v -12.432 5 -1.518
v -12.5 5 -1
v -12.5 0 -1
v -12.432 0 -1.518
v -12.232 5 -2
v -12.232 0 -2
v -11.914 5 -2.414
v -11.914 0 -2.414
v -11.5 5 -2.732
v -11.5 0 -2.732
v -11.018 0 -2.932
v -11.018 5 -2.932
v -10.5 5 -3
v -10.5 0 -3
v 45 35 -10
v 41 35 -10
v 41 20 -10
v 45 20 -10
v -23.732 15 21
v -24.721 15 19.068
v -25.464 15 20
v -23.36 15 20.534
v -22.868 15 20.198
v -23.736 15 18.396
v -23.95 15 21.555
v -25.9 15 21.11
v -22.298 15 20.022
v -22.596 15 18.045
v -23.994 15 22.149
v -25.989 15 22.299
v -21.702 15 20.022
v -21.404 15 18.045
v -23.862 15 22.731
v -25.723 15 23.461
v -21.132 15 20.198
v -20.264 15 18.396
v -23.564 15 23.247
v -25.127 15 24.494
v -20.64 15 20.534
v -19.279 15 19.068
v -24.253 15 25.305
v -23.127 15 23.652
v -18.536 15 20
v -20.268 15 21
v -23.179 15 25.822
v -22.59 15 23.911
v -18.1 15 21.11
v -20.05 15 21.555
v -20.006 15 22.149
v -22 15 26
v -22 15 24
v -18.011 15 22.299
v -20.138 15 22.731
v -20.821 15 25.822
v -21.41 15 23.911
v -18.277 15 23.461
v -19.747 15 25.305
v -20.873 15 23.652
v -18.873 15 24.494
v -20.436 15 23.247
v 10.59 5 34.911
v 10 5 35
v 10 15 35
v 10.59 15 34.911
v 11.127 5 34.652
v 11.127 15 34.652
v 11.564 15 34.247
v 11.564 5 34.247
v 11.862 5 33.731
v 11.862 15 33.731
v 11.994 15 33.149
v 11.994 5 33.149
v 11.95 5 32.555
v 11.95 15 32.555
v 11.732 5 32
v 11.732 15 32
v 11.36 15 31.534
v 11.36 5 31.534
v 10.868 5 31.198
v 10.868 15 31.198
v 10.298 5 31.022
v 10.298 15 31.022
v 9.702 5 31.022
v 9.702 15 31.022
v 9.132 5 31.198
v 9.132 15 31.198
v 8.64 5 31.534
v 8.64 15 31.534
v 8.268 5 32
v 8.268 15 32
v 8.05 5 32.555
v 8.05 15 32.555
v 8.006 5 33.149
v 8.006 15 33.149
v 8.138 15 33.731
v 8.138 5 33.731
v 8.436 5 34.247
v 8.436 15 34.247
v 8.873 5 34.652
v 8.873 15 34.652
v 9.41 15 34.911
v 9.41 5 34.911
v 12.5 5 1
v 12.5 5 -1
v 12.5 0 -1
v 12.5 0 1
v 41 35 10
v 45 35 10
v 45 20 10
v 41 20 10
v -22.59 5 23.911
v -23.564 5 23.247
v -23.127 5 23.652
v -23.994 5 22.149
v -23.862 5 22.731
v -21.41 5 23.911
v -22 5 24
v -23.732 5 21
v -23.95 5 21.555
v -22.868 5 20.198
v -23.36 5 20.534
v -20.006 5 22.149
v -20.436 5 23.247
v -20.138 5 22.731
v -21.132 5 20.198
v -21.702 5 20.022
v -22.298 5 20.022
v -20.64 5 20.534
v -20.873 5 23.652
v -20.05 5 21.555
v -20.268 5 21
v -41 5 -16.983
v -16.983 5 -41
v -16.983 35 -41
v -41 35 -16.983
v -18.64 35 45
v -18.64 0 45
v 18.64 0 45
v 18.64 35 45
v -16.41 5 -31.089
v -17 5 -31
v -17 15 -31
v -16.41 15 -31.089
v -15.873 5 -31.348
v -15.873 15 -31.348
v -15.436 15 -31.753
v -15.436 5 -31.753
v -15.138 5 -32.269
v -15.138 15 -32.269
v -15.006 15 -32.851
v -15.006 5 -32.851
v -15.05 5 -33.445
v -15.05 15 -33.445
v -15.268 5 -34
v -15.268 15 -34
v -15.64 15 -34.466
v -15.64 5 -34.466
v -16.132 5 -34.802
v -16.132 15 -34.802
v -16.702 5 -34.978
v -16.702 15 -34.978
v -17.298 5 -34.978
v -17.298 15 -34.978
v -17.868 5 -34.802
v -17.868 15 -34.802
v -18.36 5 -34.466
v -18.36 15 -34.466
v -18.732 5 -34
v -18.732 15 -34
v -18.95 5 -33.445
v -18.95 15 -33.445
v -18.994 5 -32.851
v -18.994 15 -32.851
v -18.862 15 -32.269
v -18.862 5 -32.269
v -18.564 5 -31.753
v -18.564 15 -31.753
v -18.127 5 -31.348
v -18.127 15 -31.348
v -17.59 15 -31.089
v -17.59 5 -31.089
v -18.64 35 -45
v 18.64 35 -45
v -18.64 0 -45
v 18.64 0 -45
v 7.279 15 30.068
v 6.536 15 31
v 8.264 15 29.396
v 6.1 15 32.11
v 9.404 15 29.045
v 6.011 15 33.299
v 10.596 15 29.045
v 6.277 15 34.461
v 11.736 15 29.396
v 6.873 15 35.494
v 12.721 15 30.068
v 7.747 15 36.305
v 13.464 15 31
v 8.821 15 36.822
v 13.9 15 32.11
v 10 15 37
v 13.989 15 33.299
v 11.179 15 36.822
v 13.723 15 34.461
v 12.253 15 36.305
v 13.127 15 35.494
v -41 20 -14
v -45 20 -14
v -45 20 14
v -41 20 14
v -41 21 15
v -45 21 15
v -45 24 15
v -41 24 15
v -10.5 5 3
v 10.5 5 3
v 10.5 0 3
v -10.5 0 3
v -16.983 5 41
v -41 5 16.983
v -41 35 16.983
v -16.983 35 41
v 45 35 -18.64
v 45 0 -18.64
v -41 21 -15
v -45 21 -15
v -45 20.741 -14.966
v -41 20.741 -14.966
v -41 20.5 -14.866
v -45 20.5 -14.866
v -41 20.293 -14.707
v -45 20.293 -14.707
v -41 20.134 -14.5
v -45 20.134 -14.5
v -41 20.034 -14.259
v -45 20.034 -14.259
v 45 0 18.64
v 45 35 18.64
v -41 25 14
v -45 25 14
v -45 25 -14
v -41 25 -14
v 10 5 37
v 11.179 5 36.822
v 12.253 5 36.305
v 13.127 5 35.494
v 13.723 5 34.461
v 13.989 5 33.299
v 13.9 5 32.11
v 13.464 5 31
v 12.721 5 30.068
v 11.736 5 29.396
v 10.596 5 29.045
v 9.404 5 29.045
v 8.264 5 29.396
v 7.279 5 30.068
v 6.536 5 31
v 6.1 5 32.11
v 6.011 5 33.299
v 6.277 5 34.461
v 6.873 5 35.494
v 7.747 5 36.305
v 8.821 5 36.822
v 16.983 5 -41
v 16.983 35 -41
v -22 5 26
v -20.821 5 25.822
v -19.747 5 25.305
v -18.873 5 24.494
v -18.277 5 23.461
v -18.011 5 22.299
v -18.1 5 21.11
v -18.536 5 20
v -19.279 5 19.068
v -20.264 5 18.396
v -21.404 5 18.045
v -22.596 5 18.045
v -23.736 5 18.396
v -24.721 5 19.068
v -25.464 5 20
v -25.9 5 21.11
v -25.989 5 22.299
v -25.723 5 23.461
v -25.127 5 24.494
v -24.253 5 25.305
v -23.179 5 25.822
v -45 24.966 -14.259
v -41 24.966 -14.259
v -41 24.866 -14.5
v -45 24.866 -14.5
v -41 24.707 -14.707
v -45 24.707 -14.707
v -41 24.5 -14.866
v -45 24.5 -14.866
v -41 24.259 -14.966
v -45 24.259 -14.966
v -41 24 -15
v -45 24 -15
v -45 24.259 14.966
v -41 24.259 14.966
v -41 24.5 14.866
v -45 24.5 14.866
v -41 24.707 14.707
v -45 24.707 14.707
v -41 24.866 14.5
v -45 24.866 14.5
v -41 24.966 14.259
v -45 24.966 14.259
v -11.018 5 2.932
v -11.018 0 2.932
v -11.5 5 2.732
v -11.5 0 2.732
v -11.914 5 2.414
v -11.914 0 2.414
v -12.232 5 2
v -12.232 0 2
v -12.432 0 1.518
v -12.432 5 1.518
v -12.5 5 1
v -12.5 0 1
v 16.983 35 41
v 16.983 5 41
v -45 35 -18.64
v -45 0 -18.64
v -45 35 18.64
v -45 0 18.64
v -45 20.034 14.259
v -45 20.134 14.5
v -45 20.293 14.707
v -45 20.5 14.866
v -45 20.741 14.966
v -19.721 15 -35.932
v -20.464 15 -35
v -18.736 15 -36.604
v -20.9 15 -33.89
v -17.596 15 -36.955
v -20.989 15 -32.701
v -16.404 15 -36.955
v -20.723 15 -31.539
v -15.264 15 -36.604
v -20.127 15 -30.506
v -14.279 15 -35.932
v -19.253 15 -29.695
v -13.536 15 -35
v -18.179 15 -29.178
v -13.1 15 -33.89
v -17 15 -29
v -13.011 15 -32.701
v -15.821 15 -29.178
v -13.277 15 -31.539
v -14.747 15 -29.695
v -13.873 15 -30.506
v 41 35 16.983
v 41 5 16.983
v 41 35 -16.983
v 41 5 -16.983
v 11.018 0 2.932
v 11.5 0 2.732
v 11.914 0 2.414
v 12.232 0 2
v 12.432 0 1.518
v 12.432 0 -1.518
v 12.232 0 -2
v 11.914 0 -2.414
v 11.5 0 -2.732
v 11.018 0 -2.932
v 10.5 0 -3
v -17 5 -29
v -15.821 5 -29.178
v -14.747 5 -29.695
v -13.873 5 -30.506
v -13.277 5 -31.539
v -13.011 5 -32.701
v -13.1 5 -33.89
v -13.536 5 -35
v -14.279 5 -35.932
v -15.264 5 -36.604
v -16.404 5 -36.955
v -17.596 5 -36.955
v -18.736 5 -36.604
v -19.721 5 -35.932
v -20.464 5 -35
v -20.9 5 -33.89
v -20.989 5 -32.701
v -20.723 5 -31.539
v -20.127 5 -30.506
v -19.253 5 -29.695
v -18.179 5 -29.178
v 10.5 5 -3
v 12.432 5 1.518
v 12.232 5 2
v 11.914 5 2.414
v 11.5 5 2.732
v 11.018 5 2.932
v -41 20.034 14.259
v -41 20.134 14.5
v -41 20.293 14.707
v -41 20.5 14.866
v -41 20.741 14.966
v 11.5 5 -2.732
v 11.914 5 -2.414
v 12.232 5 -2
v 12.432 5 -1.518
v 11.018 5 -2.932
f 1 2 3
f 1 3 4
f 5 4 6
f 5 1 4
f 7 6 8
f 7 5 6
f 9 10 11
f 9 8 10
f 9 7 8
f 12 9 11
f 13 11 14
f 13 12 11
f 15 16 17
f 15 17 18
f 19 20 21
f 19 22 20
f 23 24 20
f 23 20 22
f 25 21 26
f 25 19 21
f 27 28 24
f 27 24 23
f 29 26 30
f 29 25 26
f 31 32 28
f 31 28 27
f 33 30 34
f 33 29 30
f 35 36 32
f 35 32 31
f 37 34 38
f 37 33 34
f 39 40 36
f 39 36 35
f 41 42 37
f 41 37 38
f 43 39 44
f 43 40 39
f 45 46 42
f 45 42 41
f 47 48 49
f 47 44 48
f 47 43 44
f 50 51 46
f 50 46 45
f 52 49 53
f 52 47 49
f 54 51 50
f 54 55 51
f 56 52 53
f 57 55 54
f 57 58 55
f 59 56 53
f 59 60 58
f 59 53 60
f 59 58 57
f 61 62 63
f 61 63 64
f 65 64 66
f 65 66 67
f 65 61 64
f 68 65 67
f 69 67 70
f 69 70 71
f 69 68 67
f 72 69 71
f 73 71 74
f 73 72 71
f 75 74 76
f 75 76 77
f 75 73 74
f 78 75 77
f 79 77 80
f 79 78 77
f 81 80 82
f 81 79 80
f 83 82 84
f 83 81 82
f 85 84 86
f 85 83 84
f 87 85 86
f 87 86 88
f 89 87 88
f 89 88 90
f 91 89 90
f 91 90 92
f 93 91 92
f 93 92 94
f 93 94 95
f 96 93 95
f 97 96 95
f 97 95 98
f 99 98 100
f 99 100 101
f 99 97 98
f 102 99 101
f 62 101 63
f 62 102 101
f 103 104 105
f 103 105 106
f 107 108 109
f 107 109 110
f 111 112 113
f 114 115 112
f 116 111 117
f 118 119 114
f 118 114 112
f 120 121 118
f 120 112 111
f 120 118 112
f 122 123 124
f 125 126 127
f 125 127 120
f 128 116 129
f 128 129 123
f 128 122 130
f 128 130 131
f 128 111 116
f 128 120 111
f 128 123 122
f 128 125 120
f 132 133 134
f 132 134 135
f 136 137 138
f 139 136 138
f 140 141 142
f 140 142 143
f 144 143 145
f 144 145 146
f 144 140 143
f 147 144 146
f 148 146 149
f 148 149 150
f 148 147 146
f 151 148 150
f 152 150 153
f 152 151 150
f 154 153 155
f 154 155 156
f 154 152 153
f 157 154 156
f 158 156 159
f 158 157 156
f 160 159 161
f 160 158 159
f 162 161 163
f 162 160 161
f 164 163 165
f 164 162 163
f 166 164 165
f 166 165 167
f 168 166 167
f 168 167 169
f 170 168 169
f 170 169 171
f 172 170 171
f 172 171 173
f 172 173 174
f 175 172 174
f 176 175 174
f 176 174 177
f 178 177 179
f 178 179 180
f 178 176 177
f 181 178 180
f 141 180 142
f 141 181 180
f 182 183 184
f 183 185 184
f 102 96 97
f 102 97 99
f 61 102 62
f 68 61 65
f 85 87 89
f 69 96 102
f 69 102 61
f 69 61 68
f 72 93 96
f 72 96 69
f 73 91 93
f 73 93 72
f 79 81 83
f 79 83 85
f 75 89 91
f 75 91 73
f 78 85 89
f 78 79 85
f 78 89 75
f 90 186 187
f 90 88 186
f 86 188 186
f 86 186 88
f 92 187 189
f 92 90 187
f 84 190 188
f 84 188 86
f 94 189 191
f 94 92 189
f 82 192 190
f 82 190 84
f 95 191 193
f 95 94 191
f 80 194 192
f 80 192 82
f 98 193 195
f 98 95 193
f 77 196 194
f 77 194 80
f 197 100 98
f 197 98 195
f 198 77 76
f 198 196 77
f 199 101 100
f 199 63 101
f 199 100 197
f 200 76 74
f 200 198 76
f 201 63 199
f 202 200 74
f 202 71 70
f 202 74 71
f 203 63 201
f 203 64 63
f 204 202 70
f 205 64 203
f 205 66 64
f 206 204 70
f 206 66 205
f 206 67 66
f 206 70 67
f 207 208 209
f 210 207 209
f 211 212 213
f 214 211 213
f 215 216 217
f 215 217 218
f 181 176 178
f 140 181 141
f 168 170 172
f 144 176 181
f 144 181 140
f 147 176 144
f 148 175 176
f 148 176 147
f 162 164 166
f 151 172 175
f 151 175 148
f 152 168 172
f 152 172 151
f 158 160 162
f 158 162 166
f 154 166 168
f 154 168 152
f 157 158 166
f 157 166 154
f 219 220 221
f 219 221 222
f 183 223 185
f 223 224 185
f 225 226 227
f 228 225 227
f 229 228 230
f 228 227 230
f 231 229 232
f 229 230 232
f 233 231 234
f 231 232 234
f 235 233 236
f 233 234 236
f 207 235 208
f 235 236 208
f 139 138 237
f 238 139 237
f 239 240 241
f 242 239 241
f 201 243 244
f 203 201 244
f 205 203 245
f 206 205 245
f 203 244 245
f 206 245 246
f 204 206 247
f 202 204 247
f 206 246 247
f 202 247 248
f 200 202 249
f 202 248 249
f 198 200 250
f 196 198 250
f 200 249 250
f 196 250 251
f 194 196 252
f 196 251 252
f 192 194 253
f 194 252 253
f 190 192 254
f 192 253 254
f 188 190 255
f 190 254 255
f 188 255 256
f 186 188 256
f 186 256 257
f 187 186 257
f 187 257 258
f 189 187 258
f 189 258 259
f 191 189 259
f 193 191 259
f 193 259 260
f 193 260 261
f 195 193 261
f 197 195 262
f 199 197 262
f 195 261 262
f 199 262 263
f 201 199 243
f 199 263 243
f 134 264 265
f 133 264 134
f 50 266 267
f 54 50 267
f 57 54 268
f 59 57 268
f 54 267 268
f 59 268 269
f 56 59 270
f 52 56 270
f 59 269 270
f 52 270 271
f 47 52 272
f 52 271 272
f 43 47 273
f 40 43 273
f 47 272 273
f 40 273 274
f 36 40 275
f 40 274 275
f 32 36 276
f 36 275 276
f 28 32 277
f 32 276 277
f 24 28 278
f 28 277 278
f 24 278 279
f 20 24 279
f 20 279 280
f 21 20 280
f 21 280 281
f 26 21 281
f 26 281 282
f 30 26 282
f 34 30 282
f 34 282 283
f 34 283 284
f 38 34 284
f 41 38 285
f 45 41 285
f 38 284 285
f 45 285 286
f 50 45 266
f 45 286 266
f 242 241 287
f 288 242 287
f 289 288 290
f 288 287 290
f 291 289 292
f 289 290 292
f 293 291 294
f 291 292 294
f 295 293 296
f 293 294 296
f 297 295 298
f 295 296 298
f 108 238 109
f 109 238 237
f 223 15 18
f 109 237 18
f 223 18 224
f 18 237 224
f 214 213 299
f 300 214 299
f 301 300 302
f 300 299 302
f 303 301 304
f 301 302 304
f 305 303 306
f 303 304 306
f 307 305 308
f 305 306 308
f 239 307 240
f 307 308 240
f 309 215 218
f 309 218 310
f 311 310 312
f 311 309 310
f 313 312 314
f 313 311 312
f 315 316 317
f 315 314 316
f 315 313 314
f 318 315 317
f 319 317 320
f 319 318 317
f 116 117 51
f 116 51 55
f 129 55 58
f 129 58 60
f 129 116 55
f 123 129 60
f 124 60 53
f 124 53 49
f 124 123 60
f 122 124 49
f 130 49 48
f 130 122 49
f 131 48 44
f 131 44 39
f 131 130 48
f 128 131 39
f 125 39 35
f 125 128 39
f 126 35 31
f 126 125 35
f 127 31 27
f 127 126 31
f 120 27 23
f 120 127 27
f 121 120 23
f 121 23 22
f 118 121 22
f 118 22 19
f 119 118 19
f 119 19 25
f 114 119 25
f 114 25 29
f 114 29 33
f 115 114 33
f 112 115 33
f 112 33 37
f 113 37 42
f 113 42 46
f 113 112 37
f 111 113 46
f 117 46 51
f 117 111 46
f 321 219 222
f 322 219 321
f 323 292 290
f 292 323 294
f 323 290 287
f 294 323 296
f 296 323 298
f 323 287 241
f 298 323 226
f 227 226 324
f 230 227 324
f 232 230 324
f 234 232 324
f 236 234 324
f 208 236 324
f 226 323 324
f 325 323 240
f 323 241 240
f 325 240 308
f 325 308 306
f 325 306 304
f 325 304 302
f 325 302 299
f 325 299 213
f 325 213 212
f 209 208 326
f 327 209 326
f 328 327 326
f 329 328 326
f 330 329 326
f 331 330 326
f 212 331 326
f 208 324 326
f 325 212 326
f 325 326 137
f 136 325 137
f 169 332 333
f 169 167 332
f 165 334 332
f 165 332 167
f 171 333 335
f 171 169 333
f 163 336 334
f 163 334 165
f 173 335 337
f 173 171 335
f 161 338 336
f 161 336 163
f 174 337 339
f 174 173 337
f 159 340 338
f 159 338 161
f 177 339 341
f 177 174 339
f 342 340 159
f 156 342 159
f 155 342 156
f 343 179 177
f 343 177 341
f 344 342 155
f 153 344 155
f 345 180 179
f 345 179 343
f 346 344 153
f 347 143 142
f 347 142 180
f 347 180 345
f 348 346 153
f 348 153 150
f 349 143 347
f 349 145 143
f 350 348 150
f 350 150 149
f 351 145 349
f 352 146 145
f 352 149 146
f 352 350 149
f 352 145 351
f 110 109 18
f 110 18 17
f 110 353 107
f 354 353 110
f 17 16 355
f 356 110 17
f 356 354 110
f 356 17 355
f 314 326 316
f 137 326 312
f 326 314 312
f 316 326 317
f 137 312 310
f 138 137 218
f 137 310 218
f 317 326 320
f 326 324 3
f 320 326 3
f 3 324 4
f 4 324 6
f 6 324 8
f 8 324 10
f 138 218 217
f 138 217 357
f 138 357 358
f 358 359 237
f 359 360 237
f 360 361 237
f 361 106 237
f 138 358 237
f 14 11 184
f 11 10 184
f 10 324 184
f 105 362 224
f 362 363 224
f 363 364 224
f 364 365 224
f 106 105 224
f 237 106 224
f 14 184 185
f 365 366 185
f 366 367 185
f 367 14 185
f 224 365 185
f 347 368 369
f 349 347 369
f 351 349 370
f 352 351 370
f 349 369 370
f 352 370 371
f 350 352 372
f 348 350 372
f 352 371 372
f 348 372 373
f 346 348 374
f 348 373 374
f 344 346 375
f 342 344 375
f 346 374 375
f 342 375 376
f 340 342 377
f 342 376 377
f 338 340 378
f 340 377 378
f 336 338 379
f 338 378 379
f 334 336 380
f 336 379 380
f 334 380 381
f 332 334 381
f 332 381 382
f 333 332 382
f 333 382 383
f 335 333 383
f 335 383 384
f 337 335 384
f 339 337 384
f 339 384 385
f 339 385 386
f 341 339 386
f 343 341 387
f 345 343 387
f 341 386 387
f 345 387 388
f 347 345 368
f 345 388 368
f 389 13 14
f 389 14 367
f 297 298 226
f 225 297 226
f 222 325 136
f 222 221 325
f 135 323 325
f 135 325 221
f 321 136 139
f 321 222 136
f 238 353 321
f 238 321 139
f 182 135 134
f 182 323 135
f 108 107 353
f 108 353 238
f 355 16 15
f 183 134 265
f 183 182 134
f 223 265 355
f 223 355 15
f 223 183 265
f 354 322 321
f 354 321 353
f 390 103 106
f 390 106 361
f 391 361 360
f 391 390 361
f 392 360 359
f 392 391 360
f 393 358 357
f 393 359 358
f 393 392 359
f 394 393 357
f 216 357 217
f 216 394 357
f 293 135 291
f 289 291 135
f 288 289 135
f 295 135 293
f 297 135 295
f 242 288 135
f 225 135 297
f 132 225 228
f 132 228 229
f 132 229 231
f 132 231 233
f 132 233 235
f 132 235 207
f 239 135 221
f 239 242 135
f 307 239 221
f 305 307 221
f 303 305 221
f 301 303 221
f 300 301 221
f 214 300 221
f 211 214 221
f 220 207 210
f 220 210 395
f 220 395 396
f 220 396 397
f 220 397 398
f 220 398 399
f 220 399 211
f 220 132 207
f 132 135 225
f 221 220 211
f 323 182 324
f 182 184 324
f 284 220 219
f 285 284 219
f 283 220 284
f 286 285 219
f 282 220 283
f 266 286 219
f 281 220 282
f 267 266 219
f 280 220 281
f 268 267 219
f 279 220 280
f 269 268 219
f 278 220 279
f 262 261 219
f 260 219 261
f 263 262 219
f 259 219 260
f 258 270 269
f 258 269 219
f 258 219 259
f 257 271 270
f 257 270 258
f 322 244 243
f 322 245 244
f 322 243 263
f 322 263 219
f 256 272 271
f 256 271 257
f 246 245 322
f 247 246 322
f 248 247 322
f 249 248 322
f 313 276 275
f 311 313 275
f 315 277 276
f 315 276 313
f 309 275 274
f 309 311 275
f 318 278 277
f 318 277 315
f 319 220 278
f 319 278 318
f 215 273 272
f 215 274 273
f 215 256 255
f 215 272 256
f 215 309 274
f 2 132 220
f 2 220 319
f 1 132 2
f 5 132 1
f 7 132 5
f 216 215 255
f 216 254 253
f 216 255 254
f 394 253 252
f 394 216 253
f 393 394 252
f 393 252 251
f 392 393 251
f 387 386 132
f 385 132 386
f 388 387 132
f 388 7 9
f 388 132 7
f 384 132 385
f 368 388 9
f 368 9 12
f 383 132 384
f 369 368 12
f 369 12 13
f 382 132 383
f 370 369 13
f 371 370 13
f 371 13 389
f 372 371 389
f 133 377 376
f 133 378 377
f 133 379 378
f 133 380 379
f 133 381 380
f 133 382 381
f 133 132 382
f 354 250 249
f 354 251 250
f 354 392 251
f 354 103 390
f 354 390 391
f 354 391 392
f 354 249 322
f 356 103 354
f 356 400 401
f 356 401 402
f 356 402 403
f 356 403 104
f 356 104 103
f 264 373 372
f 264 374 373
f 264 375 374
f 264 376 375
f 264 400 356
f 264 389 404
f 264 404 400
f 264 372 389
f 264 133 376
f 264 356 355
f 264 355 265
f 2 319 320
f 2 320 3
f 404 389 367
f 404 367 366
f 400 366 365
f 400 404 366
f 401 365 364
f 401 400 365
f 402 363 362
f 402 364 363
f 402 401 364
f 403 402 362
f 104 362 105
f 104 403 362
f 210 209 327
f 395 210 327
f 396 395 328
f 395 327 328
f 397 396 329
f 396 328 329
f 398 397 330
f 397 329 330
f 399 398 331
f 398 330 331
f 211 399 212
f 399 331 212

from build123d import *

# Parameters (mm, degrees)
EXTRUDE_1_DEPTH     = 5
EXTRUDE_3_DEPTH     = 30
SKETCH_6_R          = 4
SKETCH_6_R_2        = 2
EXTRUDE_4_DEPTH     = 10
CUT_EXTRUDE_1_DEPTH = 10
CUT_EXTRUDE_3_DEPTH = 10
CUT_EXTRUDE_4_DEPTH = 15


with BuildPart() as part:
    # 草图1 → 凸台-拉伸1 (new body)
    with BuildSketch(Plane(origin=(0, 0, 0), x_dir=(1, 0, 0), z_dir=(0, 1, 0))):
        Polygon((45, 18.639610307), (18.639610307, 45), (-18.639610307, 45), (-45, 18.639610307), (-45, -18.639610307), (-18.639610307, -45), (18.639610307, -45), (45, -18.639610307), align=None)
    extrude(amount=EXTRUDE_1_DEPTH)

    # 草图5 → 凸台-拉伸3 (add)
    with BuildSketch(Plane(origin=(0, 5, 0), x_dir=(1, 0, 0), z_dir=(0, 1, 0))):
        Polygon((45, -18.639610307), (45, 18.639610307), (18.639610307, 45), (-18.639610307, 45), (-45, 18.639610307), (-45, -18.639610307), (-18.639610307, -45), (18.639610307, -45), align=None)
        Polygon((41, 16.982756057), (16.982756057, 41), (-16.982756057, 41), (-41, 16.982756057), (-41, -16.982756057), (-16.982756057, -41), (16.982756057, -41), (41, -16.982756057), align=None, mode=Mode.SUBTRACT)
    extrude(amount=EXTRUDE_3_DEPTH)

    # 草图6 → 凸台-拉伸4 (add)
    # profile 1 of 3: a face of its own
    with BuildSketch(Plane(origin=(0, 5, 0), x_dir=(1, 0, 0), z_dir=(0, 1, 0))):
        with Locations(Location((-17, 33, 0), (0, 0, 270))):
            Circle(SKETCH_6_R)
        with Locations(Location((-17, 33, 0), (0, 0, 270))):
            Circle(SKETCH_6_R_2, mode=Mode.SUBTRACT)
    # profile 2 of 3: a face of its own
    with BuildSketch(Plane(origin=(0, 5, 0), x_dir=(1, 0, 0), z_dir=(0, 1, 0))):
        with Locations(Location((10, -33, 0), (0, 0, 270))):
            Circle(SKETCH_6_R)
        with Locations(Location((10, -33, 0), (0, 0, 270))):
            Circle(SKETCH_6_R_2, mode=Mode.SUBTRACT)
    # profile 3 of 3: a face of its own
    with BuildSketch(Plane(origin=(0, 5, 0), x_dir=(1, 0, 0), z_dir=(0, 1, 0))):
        with Locations(Location((-22, -22, 0), (0, 0, 270))):
            Circle(SKETCH_6_R)
        with Locations(Location((-22, -22, 0), (0, 0, 270))):
            Circle(SKETCH_6_R_2, mode=Mode.SUBTRACT)
    extrude(amount=EXTRUDE_4_DEPTH)

    # 草图7 → 切除-拉伸1 (cut)
    with BuildSketch(Plane(origin=(0, 5, 0), x_dir=(1, 0, 0), z_dir=(0, 1, 0))):
        with BuildLine():
            ThreePointArc((10.5, 3), (11.914213562, 2.414213562), (12.5, 1))
            Line((12.5, 1), (12.5, -1))
            ThreePointArc((12.5, -1), (11.914213562, -2.414213562), (10.5, -3))
            Line((10.5, -3), (-10.5, -3))
            ThreePointArc((-10.5, -3), (-11.914213562, -2.414213562), (-12.5, -1))
            Line((-12.5, -1), (-12.5, 1))
            ThreePointArc((-12.5, 1), (-11.914213562, 2.414213562), (-10.5, 3))
            Line((-10.5, 3), (10.5, 3))
        make_face()
    extrude(amount=-CUT_EXTRUDE_1_DEPTH, mode=Mode.SUBTRACT)

    # 草图10 → 切除-拉伸3 (cut)
    with BuildSketch(Plane.ZY.offset(45)):
        with BuildLine():
            Line((0, 20), (14, 20))
            ThreePointArc((14, 20), (14.707106781, 20.292893219), (15, 21))
            Line((15, 21), (15, 24))
            ThreePointArc((15, 24), (14.707106781, 24.707106781), (14, 25))
            Line((14, 25), (-14, 25))
            ThreePointArc((-14, 25), (-14.707106781, 24.707106781), (-15, 24))
            Line((-15, 24), (-15, 21))
            ThreePointArc((-15, 21), (-14.707106781, 20.292893219), (-14, 20))
            Line((-14, 20), (0, 20))
        make_face()
    extrude(amount=-CUT_EXTRUDE_3_DEPTH, mode=Mode.SUBTRACT)

    # 草图11 → 切除-拉伸4 (cut)
    with BuildSketch(Plane(origin=(0, 35, 0), x_dir=(1, 0, 0), z_dir=(0, 1, 0))):
        Polygon((41, 0), (41, 10), (45, 10), (45, -10), (41, -10), align=None)
    extrude(amount=-CUT_EXTRUDE_4_DEPTH, mode=Mode.SUBTRACT)


solid = part.part
